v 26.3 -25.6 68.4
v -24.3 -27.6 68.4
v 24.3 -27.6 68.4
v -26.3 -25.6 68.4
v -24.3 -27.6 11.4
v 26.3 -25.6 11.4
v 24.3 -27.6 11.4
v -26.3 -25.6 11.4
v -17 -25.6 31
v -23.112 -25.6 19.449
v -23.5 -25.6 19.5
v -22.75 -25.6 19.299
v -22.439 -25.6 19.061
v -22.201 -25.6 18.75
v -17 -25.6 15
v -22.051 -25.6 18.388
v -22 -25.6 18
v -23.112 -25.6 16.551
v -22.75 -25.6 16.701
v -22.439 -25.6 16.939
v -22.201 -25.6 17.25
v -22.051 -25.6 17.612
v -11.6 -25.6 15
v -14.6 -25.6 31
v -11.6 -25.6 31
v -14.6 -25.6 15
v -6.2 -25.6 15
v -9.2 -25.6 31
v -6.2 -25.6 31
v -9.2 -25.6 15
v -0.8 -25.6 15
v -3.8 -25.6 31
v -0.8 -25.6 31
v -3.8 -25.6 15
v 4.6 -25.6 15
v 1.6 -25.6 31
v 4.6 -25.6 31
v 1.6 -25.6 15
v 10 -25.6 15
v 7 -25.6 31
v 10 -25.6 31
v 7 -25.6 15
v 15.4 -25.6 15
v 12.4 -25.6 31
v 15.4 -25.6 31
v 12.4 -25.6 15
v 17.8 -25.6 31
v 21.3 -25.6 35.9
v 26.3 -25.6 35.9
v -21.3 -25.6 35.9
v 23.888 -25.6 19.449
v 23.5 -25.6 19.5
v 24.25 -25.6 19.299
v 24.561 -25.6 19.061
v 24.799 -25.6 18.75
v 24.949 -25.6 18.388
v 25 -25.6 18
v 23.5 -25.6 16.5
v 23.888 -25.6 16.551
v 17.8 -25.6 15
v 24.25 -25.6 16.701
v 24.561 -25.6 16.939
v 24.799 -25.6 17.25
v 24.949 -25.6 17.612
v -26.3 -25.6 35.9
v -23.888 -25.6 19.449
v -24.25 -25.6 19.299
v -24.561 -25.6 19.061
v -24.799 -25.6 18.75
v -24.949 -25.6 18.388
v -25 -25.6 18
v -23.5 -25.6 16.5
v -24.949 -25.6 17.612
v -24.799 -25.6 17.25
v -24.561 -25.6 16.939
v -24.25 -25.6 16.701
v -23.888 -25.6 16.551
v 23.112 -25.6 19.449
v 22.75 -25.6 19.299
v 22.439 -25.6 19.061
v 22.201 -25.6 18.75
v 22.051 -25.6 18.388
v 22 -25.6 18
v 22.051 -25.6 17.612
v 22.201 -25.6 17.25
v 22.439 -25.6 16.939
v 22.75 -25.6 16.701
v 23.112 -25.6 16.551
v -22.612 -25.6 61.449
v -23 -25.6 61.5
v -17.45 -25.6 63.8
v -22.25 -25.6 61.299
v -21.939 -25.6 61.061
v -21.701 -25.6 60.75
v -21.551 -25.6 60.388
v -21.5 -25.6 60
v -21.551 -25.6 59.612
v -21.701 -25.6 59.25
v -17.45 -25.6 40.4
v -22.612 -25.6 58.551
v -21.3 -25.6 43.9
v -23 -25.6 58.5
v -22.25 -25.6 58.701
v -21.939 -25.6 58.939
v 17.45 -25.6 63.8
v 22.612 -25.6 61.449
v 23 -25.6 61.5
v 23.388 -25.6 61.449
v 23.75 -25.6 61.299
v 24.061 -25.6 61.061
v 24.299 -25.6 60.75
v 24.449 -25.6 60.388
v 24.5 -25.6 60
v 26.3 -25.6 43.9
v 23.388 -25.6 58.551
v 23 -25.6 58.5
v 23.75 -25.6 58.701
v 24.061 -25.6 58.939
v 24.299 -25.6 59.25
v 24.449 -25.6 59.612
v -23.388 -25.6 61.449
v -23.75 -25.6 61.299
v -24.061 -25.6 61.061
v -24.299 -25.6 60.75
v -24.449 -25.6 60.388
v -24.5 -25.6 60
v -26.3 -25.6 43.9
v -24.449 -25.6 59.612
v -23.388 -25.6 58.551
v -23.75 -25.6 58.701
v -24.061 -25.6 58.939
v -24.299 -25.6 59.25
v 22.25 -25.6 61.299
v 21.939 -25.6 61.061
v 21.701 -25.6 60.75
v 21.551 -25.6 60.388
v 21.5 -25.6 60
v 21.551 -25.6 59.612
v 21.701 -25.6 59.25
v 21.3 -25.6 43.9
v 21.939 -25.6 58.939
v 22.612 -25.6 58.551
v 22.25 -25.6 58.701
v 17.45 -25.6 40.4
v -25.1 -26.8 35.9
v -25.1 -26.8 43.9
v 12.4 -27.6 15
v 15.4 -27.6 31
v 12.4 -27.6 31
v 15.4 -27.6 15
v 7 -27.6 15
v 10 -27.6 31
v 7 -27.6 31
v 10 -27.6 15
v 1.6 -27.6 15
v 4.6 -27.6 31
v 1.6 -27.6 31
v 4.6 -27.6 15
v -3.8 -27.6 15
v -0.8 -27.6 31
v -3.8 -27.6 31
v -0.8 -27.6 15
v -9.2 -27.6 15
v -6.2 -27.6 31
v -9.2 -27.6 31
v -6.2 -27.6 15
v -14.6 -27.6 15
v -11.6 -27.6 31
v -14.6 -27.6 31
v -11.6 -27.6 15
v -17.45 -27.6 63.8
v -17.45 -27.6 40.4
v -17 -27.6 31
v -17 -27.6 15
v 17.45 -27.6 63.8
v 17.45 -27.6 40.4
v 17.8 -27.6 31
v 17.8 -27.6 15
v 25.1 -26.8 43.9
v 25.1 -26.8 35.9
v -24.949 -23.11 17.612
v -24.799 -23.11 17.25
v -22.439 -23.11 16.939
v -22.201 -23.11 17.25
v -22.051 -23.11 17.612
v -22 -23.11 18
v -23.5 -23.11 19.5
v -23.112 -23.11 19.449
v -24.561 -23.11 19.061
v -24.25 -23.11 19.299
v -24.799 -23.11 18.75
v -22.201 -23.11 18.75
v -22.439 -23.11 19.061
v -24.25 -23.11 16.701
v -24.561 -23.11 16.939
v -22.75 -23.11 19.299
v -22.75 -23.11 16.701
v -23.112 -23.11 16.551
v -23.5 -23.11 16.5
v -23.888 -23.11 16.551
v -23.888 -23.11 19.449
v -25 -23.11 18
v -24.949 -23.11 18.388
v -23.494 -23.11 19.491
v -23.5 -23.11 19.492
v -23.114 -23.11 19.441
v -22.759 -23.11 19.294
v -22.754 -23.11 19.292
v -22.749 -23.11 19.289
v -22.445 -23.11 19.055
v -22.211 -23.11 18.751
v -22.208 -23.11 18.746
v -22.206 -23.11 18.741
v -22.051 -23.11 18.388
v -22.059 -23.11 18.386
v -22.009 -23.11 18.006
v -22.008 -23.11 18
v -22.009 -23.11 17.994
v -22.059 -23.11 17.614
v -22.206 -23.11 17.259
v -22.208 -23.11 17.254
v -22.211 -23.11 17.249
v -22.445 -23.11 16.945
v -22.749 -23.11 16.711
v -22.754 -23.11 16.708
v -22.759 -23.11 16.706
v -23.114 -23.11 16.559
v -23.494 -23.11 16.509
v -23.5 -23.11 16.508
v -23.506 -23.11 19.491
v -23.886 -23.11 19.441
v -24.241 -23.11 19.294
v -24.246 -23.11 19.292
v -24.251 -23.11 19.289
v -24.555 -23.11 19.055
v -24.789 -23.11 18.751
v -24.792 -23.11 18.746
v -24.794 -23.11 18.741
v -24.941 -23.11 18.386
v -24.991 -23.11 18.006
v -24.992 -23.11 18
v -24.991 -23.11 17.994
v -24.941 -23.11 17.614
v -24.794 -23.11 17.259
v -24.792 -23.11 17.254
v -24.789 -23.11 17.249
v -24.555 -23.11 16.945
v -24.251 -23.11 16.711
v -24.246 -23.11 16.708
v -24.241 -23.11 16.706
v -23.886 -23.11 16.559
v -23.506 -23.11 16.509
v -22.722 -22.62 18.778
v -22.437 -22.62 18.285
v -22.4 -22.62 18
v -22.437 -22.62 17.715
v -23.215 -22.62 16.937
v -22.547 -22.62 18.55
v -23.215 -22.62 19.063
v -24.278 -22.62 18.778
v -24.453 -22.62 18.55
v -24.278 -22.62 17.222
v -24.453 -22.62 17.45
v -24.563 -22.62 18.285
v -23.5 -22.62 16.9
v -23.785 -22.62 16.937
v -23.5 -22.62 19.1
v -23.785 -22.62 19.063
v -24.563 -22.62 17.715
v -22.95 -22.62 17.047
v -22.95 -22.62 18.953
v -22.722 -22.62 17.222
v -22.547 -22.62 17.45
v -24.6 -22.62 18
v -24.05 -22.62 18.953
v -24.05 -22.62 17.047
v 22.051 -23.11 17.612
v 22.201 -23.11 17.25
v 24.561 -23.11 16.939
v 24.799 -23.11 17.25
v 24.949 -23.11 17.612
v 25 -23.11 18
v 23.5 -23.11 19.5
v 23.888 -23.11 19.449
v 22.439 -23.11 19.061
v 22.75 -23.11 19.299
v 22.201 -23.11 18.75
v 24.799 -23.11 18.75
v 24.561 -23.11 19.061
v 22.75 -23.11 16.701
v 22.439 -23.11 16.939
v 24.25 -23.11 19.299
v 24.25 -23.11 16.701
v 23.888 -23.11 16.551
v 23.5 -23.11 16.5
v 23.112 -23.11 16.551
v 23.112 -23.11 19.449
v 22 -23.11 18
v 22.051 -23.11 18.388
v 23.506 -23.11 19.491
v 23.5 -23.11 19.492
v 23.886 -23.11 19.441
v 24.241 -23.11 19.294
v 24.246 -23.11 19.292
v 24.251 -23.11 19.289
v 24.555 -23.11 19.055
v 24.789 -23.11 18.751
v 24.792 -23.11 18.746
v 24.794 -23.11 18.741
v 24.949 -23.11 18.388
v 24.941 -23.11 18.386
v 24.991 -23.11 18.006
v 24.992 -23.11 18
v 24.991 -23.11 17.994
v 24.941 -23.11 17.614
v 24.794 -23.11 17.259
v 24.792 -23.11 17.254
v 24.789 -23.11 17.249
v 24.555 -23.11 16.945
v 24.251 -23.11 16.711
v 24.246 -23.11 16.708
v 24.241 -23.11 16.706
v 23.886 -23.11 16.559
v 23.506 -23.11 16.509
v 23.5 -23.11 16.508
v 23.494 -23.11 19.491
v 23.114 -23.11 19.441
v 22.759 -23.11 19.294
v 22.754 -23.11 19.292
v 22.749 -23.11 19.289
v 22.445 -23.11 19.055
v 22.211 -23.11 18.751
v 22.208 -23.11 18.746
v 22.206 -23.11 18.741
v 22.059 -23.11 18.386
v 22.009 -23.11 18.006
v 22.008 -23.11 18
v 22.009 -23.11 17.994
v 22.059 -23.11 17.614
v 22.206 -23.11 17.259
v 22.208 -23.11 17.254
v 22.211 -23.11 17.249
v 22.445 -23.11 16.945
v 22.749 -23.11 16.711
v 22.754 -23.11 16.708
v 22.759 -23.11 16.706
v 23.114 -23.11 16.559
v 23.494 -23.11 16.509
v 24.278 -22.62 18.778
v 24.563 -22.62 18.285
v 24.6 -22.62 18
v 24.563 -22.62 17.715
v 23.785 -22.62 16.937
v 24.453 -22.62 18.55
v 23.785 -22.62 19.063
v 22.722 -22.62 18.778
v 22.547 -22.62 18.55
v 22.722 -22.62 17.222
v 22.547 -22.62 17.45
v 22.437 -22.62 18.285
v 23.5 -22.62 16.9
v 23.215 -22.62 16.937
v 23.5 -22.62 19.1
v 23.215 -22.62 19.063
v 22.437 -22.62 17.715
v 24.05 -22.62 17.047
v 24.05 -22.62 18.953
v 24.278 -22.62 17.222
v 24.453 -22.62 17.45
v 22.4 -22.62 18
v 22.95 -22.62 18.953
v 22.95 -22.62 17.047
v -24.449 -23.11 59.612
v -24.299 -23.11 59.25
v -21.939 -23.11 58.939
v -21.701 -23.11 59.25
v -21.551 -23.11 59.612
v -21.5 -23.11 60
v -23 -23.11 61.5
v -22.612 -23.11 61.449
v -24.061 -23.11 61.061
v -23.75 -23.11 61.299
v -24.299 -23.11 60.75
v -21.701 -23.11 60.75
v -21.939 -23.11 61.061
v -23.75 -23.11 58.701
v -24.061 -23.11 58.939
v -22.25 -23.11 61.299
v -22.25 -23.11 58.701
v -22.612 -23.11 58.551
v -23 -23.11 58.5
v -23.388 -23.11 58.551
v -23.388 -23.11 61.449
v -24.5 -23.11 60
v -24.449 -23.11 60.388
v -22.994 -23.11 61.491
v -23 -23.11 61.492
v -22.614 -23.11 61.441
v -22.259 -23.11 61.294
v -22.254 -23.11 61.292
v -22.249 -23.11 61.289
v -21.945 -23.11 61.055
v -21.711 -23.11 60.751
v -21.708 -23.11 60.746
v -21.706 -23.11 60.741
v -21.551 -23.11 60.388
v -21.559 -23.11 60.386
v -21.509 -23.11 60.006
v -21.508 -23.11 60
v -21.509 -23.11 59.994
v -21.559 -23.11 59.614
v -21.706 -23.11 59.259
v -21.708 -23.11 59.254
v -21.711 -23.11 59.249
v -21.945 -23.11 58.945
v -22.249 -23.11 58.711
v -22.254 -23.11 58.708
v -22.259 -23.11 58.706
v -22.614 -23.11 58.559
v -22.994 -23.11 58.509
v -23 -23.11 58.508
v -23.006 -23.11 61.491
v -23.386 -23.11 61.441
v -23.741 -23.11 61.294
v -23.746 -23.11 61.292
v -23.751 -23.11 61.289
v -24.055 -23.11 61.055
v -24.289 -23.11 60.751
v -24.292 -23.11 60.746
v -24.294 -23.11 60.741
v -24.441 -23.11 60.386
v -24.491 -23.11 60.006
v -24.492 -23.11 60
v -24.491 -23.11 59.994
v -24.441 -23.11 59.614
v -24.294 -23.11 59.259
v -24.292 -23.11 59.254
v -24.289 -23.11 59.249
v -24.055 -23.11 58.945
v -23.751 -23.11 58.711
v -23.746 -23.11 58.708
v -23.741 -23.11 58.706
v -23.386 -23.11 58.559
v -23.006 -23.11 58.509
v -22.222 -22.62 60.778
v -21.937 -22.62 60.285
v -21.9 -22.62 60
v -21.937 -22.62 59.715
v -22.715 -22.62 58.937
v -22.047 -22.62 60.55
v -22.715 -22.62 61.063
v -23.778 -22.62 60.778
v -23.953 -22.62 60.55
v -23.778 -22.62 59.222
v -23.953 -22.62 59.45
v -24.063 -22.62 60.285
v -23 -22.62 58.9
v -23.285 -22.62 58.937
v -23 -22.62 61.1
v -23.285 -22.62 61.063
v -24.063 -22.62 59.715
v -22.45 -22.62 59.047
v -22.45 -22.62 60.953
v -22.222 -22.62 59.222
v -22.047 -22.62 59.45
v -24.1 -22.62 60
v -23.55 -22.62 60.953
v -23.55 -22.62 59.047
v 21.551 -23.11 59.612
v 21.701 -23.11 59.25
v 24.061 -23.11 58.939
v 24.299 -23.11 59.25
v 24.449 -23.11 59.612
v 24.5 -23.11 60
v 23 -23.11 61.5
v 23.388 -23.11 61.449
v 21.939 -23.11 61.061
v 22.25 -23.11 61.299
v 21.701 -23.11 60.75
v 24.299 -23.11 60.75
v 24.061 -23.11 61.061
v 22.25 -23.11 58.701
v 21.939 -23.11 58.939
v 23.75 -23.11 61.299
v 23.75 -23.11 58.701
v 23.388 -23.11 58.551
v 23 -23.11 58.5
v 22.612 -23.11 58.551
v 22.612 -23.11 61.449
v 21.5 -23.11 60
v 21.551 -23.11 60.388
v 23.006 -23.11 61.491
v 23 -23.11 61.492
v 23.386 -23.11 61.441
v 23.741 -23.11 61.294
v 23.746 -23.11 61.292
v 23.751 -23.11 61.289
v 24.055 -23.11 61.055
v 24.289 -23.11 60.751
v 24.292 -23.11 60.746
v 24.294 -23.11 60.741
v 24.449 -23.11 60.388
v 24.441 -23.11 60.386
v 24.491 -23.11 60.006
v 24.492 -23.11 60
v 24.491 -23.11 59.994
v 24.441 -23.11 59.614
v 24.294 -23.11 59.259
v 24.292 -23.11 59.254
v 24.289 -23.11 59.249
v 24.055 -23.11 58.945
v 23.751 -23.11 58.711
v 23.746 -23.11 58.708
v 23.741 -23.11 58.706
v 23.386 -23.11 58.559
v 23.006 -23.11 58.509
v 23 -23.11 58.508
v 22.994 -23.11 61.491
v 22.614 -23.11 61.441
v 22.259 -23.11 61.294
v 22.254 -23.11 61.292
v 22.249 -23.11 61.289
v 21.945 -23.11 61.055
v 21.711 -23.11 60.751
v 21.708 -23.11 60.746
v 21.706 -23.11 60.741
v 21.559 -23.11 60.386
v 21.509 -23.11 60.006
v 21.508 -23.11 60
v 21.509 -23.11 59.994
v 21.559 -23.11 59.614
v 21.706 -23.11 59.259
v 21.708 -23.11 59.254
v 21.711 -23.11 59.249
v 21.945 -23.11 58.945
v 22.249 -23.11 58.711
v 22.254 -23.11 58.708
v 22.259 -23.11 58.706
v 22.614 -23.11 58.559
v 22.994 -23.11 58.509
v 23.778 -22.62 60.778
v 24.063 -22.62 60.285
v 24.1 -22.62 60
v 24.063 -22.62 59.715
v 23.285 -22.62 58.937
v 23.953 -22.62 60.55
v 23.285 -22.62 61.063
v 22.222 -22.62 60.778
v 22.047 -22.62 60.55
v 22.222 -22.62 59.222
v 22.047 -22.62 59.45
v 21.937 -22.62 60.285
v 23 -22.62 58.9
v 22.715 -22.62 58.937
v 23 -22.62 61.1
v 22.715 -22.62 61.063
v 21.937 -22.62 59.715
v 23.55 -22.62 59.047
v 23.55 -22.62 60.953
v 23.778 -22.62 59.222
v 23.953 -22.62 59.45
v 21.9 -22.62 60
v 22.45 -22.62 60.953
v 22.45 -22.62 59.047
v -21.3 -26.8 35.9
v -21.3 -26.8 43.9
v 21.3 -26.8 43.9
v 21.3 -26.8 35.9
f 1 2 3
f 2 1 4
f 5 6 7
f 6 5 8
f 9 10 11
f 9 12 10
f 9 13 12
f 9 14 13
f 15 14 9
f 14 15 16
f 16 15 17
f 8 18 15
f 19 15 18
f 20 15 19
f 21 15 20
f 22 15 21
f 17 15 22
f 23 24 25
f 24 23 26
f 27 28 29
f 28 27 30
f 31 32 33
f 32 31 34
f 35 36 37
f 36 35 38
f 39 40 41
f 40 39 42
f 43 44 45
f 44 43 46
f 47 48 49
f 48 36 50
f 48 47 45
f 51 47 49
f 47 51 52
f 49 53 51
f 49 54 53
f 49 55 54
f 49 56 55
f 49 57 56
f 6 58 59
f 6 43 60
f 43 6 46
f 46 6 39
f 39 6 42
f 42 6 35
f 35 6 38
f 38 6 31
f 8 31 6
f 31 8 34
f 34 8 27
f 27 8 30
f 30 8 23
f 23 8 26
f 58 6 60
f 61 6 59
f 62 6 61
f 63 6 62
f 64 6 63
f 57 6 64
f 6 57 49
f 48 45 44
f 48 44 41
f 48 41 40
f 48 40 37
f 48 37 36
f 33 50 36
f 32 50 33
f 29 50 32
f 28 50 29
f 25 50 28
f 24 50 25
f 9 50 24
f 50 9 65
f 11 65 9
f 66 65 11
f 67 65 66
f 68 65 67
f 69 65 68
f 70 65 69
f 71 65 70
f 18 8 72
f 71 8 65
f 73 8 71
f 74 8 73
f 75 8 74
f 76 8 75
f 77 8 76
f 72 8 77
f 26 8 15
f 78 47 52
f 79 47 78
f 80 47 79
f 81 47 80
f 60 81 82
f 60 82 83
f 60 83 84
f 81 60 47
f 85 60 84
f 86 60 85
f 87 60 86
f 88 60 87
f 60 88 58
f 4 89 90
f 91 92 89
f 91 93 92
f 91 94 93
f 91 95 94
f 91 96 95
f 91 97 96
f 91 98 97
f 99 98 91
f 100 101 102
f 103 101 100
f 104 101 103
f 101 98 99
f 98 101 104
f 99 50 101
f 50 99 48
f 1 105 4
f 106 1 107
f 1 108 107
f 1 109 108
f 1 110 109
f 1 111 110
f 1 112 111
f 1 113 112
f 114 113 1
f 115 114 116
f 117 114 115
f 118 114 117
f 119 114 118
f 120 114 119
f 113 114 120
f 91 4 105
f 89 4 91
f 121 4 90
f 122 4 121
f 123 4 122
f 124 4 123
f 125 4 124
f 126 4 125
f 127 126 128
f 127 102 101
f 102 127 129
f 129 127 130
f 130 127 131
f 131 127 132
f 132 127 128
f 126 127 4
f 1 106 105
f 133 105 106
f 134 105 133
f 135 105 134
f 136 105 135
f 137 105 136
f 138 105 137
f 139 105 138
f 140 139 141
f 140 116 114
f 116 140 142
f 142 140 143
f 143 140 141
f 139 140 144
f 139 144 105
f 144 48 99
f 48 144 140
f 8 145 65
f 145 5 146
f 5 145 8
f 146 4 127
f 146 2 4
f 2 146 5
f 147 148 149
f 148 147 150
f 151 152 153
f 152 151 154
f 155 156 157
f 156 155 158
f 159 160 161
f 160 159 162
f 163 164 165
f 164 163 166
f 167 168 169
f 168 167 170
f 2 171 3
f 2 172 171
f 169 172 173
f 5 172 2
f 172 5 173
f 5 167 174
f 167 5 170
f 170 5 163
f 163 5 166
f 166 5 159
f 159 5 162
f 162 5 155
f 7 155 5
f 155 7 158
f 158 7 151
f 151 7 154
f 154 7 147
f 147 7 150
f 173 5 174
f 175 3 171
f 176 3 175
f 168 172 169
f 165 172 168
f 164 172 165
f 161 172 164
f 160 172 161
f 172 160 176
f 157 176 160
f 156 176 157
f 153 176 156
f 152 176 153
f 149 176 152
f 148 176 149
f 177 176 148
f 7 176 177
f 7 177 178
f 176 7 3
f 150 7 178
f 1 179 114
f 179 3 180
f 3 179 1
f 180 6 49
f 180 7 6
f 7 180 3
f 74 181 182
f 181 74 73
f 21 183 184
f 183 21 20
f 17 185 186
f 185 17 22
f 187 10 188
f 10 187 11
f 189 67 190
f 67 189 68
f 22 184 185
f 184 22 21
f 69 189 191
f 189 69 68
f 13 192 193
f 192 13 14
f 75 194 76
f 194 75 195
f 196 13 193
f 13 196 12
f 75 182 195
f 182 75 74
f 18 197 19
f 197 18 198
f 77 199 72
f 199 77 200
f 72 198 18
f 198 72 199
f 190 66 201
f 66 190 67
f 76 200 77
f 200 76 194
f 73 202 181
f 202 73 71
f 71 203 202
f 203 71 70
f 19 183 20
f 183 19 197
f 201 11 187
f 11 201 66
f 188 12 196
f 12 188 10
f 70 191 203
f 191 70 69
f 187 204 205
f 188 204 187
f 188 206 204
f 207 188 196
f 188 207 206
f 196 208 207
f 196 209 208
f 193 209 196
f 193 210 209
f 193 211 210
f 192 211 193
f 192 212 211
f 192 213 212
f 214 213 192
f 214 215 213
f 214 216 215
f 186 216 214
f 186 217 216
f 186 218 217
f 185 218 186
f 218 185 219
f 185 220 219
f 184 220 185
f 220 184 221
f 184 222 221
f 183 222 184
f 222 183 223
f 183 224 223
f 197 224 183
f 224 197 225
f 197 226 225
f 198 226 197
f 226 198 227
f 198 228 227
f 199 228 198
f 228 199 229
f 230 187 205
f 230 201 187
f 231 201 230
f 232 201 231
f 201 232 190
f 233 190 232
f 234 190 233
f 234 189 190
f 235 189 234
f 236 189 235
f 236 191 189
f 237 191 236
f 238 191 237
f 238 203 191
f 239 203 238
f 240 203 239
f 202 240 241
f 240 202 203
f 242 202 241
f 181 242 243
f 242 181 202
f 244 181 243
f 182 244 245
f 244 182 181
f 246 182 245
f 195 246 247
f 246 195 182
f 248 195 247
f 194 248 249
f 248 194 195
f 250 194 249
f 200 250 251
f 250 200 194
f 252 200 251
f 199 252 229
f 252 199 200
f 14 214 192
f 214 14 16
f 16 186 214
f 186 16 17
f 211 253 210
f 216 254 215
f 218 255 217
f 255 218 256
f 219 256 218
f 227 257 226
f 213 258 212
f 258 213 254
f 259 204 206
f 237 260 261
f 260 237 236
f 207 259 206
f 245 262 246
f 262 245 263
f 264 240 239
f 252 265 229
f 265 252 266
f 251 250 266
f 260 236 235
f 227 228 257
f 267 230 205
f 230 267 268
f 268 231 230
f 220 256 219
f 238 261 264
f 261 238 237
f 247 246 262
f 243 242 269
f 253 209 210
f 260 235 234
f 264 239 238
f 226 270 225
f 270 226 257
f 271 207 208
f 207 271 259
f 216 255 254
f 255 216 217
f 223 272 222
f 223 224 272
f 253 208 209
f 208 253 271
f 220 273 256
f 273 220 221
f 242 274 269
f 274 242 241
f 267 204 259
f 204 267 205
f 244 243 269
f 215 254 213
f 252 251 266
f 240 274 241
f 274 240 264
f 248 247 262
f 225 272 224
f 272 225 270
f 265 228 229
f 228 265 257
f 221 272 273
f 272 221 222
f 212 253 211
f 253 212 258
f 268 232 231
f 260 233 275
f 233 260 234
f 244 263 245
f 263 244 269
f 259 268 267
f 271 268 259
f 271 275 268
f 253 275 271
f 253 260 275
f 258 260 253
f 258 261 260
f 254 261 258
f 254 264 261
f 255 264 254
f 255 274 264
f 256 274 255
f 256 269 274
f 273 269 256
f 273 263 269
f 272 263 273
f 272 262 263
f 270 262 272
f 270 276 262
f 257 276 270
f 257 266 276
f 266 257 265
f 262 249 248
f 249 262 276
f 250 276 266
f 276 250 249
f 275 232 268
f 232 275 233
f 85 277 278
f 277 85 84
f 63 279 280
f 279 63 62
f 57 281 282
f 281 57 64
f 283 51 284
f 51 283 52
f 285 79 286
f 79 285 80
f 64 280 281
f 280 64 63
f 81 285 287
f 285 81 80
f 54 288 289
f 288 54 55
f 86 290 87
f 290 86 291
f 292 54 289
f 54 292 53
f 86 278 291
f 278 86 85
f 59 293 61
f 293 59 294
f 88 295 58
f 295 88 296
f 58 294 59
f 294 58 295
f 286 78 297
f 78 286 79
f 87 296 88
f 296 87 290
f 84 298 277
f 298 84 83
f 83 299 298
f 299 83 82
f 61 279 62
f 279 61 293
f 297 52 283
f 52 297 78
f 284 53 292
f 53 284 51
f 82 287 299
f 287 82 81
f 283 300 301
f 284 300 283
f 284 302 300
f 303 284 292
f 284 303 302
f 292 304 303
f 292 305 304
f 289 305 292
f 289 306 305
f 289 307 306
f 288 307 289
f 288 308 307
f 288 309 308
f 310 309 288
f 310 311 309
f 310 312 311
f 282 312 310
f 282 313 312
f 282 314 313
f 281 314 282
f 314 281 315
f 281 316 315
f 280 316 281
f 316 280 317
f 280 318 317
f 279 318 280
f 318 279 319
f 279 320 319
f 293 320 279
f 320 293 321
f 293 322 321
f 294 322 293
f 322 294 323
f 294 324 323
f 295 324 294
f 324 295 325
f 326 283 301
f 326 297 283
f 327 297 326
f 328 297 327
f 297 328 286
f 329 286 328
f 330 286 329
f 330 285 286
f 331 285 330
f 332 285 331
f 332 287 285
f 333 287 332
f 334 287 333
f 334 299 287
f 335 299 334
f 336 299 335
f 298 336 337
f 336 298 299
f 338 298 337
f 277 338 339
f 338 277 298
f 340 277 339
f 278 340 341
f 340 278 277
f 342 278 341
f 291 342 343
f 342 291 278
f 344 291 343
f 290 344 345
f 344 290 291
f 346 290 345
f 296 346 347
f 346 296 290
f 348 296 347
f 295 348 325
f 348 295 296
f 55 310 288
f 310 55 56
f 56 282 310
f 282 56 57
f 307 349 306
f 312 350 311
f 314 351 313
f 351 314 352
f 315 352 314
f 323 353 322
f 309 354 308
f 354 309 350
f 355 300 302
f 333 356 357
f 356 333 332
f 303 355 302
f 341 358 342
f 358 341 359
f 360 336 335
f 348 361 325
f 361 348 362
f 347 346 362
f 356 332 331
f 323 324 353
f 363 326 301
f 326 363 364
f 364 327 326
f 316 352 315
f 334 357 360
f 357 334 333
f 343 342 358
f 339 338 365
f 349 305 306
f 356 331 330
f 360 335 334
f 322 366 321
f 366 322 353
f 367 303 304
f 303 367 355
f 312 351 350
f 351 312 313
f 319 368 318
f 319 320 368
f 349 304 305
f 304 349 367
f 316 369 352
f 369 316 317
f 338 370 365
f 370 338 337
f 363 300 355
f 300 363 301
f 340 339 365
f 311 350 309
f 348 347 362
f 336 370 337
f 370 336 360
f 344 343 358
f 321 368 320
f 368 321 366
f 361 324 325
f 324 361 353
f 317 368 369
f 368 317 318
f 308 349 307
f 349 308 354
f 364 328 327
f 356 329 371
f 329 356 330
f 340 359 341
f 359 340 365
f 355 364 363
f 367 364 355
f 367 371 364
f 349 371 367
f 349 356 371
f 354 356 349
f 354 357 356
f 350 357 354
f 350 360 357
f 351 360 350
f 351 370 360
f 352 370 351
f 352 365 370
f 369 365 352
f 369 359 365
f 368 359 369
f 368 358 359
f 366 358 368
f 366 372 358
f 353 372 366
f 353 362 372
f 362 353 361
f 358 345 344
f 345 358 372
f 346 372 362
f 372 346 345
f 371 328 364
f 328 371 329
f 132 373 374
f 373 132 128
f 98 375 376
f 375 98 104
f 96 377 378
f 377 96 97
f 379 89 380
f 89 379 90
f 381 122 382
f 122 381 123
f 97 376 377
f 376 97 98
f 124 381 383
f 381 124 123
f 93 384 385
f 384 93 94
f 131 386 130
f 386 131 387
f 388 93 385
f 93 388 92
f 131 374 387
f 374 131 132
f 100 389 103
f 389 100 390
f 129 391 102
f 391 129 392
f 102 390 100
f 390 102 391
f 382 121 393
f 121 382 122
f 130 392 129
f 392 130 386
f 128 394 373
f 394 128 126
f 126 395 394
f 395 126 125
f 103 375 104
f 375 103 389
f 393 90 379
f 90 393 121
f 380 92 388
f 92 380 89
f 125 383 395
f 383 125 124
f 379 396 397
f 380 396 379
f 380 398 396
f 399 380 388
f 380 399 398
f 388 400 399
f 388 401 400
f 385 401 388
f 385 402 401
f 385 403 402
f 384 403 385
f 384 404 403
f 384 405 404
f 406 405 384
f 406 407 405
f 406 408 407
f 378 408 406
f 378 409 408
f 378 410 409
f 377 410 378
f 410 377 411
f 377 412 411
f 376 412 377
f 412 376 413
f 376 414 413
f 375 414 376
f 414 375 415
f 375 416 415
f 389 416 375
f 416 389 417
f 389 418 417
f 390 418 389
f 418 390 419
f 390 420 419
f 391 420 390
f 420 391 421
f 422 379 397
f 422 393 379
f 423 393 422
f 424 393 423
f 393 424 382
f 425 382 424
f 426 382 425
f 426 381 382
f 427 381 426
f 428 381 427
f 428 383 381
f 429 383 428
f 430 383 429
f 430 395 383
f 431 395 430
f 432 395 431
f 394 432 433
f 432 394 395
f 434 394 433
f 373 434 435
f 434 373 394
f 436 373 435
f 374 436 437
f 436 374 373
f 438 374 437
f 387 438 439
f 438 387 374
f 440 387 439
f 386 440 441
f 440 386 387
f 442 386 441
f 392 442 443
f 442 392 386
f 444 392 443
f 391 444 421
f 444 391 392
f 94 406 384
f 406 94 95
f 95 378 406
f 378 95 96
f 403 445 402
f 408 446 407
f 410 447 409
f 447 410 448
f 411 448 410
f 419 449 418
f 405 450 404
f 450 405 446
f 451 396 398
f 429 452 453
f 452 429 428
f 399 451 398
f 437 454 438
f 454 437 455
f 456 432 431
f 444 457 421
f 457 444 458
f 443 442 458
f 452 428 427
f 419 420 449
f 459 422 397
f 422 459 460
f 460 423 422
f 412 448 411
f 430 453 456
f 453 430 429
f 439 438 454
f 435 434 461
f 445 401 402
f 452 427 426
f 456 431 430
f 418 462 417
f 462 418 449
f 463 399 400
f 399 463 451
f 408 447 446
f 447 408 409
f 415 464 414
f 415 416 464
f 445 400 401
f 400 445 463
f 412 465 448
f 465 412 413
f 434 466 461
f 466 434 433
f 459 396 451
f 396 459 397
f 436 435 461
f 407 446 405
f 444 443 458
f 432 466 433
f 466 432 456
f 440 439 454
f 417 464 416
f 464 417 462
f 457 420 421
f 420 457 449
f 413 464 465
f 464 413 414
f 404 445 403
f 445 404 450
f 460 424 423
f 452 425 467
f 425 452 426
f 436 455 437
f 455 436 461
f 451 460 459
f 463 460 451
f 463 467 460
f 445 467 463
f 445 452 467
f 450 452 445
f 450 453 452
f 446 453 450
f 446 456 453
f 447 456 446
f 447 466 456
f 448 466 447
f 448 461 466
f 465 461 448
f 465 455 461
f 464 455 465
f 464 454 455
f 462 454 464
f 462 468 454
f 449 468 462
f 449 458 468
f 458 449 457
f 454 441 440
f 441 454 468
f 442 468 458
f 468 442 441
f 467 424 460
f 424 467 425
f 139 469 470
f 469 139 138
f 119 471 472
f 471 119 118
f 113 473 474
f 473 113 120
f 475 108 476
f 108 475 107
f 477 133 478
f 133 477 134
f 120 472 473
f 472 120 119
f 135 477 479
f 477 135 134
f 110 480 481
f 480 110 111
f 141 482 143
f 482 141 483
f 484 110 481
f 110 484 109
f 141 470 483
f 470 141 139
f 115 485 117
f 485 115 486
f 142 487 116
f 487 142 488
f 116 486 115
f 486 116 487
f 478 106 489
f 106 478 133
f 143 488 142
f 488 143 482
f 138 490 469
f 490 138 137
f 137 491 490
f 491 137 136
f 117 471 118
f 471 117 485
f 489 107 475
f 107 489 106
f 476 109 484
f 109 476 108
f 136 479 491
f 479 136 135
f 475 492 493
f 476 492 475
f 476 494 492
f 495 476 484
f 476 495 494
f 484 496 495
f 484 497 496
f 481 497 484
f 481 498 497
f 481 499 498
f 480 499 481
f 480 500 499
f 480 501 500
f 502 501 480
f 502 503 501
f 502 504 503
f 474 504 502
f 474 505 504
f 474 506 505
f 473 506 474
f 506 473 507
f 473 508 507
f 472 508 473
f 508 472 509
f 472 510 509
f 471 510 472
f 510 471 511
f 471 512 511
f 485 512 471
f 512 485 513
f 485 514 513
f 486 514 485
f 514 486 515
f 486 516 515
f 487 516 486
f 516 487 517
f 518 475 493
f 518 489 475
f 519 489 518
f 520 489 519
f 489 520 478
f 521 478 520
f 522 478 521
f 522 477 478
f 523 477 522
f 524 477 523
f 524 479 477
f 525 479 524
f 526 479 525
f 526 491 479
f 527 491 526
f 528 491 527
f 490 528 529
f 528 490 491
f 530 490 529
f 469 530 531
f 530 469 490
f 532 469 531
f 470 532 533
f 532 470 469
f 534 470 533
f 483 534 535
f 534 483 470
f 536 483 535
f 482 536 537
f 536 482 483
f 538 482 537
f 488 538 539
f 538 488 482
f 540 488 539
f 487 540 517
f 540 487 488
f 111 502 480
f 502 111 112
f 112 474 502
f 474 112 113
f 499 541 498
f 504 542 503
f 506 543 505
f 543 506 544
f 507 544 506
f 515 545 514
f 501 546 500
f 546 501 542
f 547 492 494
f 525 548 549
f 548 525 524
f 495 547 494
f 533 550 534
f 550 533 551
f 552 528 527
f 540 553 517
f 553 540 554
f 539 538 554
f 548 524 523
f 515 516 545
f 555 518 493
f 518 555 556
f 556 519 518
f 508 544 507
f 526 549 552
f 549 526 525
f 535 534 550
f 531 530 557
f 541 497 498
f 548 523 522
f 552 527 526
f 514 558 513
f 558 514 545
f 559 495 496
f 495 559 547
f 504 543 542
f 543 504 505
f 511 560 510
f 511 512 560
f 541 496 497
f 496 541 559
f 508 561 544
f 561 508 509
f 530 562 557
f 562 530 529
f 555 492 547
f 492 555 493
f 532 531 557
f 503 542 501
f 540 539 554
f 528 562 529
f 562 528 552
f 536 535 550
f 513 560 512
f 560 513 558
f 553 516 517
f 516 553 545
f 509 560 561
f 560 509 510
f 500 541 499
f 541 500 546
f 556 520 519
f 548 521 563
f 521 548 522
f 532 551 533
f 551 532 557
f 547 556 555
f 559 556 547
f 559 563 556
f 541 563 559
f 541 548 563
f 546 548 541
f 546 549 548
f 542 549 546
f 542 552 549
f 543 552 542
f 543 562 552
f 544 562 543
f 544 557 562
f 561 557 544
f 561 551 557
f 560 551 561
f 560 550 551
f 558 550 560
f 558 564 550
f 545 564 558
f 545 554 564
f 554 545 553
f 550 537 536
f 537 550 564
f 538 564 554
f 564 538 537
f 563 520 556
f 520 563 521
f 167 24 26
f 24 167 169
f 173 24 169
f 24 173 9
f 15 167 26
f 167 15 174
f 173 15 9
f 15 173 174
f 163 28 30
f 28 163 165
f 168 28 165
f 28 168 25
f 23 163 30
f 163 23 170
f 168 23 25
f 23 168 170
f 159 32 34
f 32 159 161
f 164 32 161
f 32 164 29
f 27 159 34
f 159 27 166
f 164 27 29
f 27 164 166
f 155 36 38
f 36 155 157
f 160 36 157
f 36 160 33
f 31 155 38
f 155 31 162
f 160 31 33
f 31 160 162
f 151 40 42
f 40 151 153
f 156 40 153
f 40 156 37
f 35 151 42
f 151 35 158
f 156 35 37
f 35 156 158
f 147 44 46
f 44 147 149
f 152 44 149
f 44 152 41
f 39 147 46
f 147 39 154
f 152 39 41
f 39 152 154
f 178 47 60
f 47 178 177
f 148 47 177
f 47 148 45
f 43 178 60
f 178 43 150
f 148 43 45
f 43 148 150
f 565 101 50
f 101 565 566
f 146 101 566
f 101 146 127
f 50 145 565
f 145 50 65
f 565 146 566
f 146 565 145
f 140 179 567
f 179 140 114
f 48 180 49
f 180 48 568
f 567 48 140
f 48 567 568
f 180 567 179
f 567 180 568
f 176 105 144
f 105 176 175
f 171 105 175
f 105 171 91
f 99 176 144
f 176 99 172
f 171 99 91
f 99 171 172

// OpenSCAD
// file: ../config.scad
// Sparky - shared parameters and the module interface spec.
// All dimensions in mm. Origin: centre line of the body, on the table.
// +X = right, +Y = back, -Y = front (screen side), +Z = up.
//
// Values marked (measure) are estimates; measure your parts and edit here.

$fn = 48;

// ---------- Interface (keep fixed so modules stay swappable) ----------
outer_w   = 64.4;    // shell, collar and rack-bottom footprint
outer_y0  = -30;     // front face of the shell
outer_y1  = 26.6;    // back face of the shell
outer_d   = outer_y1 - outer_y0;          // 56.6
outer_cy  = (outer_y0 + outer_y1) / 2;    // footprint centre (Y)
corner_r  = 8;       // outer corner radius of shell, collar and rack bottom
wall      = 2;       // shell wall
in_r      = corner_r - wall;              // 6, inside radius of the shell
clear     = 0.3;     // fit clearance between printed parts

base_top  = 7;       // top of the rack's solid bottom (the collar sits on it)
collar_h  = 4;
shell_z0  = base_top + collar_h;          // 11, bottom of the shell
shell_z1  = 76;      // top of the shell

// Magnets: 6 x 3 mm neodymium discs, all N faces pointing up.
mag_d     = 6.2;     // pocket diameter (magnet 6.0)
mag_h     = 3.2;     // pocket depth (magnet 3.0)
boss_d    = 9;

mag_rack_shell = [[-23,-15],[23,-15],[-23,17],[23,17]];   // rack towers <-> shell ceiling
pin_hole  = 1.95;    // locating pins: short pieces of 1.75 mm filament
pin_depth = 3;
collar_pins = [[-15, 24.25], [15, 24.25]];   // rack bottom <-> collar
face_pins   = [[-24, -23.5], [24, -23.5]];   // rack floor <-> face frame

// ---------- Rack (the body every part slides into) ----------
rack_xo   = 29.8;    // outside of the side walls
rack_t    = 2.4;     // side wall thickness
rack_xi   = rack_xo - rack_t;            // 27.4
rack_yf   = -27.6;   // front of the face frame
rack_yb   = 21.6;    // back of the rack (open)
rack_cf   = 5.5;     // 45 deg front corner chamfer (clears the shell's inside radius, prints face-down)
rack_rb   = 3.5;     // back corner radius
floor_z   = base_top;                    // 7
floor_t   = 4.4;
in_z      = floor_z + floor_t;           // 11.4, top of the floor
rack_top  = 68.4;    // top of the walls = underside of the lid
lid_t     = 4;
lid_top   = rack_top + lid_t;            // 72.4

tower_x   = 19.9;    // inner face of the two top towers (the top spans between them)
tower_z0  = rack_top - 2;                // underside of the towers
chamfer   = 3;       // 45 deg chamfer on the towers' outer top edges


// Middle plate: part of the rack. The MPU-6050 and the amp slide into
// grooves on top of it from the back; only the boards move.
plate_z0  = 43;
plate_t   = 3;
plate_z1  = plate_z0 + plate_t;          // 46
plate_y0  = -15.2;
mpu_cx    = -11.5;                       // groove centres (X)
amp_cx    = 10;
groove_y0 = -8.6;                        // front edge of both boards (front stops)
back_gap  = 6;                           // the plate and the top stop this far short of the back: wire channel
deck_y1   = rack_yb - back_gap;          // 15.6, back edge of the plate and the top

// Board slide (slide 1)
board     = [28, 34.6, 1.6];             // expansion board (measure)
board_y0  = -12.6;
board_z   = in_z + 1;                    // board rests on two ledges

// Face frame (display + speaker), drops onto the floor in front of the walls
face_yb   = -19.4;   // back of the face frame = front of the side walls
face_t    = 2;       // front plate
flange_t  = 2;       // bottom flange the speaker stands on
// Removable front plate: presses onto the face frame with 4 round pegs
peg_d     = 3;       // peg diameter
peg_hole  = 3.1;     // hole in the frame: snug press fit in PLA (tune after a test print)
peg_l     = 3;
front_pegs = [[-23.5, 18], [23.5, 18], [-23, 60], [23, 60]];   // [x, z]
notch     = [1.2, 3, 8];                 // pull notch on each side edge: depth (y), width (x), height (z)

// ---------- Components (measure) ----------
oled      = [35.4, 1.4, 33.4];           // 1.3" OLED PCB, landscape, pins on top
glass     = [34.5, 1.4, 23];
glass_up  = 6;       // glass bottom above the PCB bottom
speaker   = [40, 4.8, 20];               // 2040 speaker standing on edge
spk_z0    = in_z + flange_t;             // 13.4
spk_post_x = 12;                         // speaker stop posts on the rack floor (|x| from here + 4)
spk_post_h = 16;
ledge_z0  = spk_z0 + speaker[2] + 0.2;   // 33.6, display shelf
oled_z0   = ledge_z0 + 1;                // 34.6
mpu       = [20.3, 15.6, 1.6];           // GY-521
amp       = [17.8, 19.3, 1.6];           // MAX98357A
mic_d     = 14;                          // INMP441, round
mic_xy    = [-2, -10];                    // mic centre on the top
touch     = [15, 11];                    // TTP223
touch_y0  = 0;                           // front edge of the touch pad on the top
battery   = [5, 40, 30];                 // LiPo 503040 on edge

// Shell openings
win_w     = 31;      // display window (active area 29.4 x 14.7)
win_z     = [oled_z0 + glass_up + 3, oled_z0 + glass_up + 20];
grille_z  = [15.4, 31.4];
usb       = [12.4, 21.3, 28.1];          // width, z0, z1
mic_hole  = 1.4;

// ---------- Helpers ----------
module rrect2d(w, d, r) { offset(r) square([w - 2*r, d - 2*r], center = true); }
module rrect(w, d, r, h) { linear_extrude(h) rrect2d(w, d, r); }
module rbox(w, d, h, r) {      // box with every edge rounded, z from 0 to h
  hull() for (x = [-1,1], y = [-1,1], z = [r, h - r])
    translate([x*(w/2 - r), y*(d/2 - r), z]) sphere(r);
}
module mag_pocket(z) { translate([0,0,z]) cylinder(d = mag_d, h = mag_h); }
module pin_hole_at(z, h = pin_depth) translate([0,0,z]) cylinder(d = pin_hole, h = h, $fn = 16);

// Plan outline of the rack (and the collar opening)
module rack_2d(grow = 0) {
  offset(delta = grow) hull() {
    polygon([[-rack_xo + rack_cf, rack_yf], [rack_xo - rack_cf, rack_yf], [rack_xo, rack_yf + rack_cf], [-rack_xo, rack_yf + rack_cf]]);
    for (s = [-1, 1]) translate([s*(rack_xo - rack_rb), rack_yb - rack_rb]) circle(rack_rb);
  }
}
// Outer footprint (shell, collar, rack bottom)
module outer_2d() translate([0, outer_cy]) rrect2d(outer_w, outer_d, corner_r);

// A profile in the X-Z plane, extruded along Y from y0 to y1.
module along_y(y0, y1) translate([0, y1, 0]) rotate([90, 0, 0]) linear_extrude(y1 - y0) children();
// A profile in the Y-Z plane, extruded along X from x0 to x1.
module along_x(x0, x1) translate([x0, 0, 0]) rotate([90, 0, 90]) linear_extrude(x1 - x0) children();
// main file
// Front plate: the 2 mm face with the display window and the speaker grille.
// It presses onto the face frame with 4 round pegs; a notch on each side edge
// lets you lever it off with a fingernail to reach the display and speaker.
// Prints face-down, pegs up.
include <../config.scad>

module front() {
  yi = rack_yf + face_t;
  difference() {
    union() {
      intersection() {
        translate([-rack_xo, rack_yf, in_z]) cube([2*rack_xo, face_t, rack_top - in_z]);
        translate([0, 0, in_z - 1]) linear_extrude(rack_top - in_z + 2) rack_2d();
      }
      // pegs with a chamfered tip
      for (p = front_pegs) translate([p[0], yi - 0.01, p[1]]) rotate([-90, 0, 0]) {
        cylinder(d = peg_d, h = peg_l - 0.5, $fn = 24);
        translate([0, 0, peg_l - 0.51]) cylinder(d1 = peg_d, d2 = peg_d - 0.8, h = 0.5, $fn = 24);
      }
    }
    // display window (the glass sits against the plate)
    translate([-glass[0]/2 - 0.2, rack_yf - 1, oled_z0 + glass_up - 0.2]) cube([glass[0] + 0.4, face_t + 2, glass[2] + 0.4]);
    // speaker grille
    for (i = [0 : 6]) translate([-17 + i*5.4, rack_yf - 1, grille_z[0] - 0.4]) cube([2.4, face_t + 2, grille_z[1] - grille_z[0]]);
    // pull notches on both side edges, cut into the back face
    // (the plate's side edges are the 45 deg corner chamfers, so the notch runs out through them)
    for (s = [-1, 1]) translate([s < 0 ? -rack_xo - 1 : rack_xo - rack_cf - notch[1], yi - notch[0], (in_z + rack_top)/2 - notch[2]/2])
      cube([notch[1] + rack_cf + 1, notch[0] + 0.01, notch[2]]);
  }
}

front();
